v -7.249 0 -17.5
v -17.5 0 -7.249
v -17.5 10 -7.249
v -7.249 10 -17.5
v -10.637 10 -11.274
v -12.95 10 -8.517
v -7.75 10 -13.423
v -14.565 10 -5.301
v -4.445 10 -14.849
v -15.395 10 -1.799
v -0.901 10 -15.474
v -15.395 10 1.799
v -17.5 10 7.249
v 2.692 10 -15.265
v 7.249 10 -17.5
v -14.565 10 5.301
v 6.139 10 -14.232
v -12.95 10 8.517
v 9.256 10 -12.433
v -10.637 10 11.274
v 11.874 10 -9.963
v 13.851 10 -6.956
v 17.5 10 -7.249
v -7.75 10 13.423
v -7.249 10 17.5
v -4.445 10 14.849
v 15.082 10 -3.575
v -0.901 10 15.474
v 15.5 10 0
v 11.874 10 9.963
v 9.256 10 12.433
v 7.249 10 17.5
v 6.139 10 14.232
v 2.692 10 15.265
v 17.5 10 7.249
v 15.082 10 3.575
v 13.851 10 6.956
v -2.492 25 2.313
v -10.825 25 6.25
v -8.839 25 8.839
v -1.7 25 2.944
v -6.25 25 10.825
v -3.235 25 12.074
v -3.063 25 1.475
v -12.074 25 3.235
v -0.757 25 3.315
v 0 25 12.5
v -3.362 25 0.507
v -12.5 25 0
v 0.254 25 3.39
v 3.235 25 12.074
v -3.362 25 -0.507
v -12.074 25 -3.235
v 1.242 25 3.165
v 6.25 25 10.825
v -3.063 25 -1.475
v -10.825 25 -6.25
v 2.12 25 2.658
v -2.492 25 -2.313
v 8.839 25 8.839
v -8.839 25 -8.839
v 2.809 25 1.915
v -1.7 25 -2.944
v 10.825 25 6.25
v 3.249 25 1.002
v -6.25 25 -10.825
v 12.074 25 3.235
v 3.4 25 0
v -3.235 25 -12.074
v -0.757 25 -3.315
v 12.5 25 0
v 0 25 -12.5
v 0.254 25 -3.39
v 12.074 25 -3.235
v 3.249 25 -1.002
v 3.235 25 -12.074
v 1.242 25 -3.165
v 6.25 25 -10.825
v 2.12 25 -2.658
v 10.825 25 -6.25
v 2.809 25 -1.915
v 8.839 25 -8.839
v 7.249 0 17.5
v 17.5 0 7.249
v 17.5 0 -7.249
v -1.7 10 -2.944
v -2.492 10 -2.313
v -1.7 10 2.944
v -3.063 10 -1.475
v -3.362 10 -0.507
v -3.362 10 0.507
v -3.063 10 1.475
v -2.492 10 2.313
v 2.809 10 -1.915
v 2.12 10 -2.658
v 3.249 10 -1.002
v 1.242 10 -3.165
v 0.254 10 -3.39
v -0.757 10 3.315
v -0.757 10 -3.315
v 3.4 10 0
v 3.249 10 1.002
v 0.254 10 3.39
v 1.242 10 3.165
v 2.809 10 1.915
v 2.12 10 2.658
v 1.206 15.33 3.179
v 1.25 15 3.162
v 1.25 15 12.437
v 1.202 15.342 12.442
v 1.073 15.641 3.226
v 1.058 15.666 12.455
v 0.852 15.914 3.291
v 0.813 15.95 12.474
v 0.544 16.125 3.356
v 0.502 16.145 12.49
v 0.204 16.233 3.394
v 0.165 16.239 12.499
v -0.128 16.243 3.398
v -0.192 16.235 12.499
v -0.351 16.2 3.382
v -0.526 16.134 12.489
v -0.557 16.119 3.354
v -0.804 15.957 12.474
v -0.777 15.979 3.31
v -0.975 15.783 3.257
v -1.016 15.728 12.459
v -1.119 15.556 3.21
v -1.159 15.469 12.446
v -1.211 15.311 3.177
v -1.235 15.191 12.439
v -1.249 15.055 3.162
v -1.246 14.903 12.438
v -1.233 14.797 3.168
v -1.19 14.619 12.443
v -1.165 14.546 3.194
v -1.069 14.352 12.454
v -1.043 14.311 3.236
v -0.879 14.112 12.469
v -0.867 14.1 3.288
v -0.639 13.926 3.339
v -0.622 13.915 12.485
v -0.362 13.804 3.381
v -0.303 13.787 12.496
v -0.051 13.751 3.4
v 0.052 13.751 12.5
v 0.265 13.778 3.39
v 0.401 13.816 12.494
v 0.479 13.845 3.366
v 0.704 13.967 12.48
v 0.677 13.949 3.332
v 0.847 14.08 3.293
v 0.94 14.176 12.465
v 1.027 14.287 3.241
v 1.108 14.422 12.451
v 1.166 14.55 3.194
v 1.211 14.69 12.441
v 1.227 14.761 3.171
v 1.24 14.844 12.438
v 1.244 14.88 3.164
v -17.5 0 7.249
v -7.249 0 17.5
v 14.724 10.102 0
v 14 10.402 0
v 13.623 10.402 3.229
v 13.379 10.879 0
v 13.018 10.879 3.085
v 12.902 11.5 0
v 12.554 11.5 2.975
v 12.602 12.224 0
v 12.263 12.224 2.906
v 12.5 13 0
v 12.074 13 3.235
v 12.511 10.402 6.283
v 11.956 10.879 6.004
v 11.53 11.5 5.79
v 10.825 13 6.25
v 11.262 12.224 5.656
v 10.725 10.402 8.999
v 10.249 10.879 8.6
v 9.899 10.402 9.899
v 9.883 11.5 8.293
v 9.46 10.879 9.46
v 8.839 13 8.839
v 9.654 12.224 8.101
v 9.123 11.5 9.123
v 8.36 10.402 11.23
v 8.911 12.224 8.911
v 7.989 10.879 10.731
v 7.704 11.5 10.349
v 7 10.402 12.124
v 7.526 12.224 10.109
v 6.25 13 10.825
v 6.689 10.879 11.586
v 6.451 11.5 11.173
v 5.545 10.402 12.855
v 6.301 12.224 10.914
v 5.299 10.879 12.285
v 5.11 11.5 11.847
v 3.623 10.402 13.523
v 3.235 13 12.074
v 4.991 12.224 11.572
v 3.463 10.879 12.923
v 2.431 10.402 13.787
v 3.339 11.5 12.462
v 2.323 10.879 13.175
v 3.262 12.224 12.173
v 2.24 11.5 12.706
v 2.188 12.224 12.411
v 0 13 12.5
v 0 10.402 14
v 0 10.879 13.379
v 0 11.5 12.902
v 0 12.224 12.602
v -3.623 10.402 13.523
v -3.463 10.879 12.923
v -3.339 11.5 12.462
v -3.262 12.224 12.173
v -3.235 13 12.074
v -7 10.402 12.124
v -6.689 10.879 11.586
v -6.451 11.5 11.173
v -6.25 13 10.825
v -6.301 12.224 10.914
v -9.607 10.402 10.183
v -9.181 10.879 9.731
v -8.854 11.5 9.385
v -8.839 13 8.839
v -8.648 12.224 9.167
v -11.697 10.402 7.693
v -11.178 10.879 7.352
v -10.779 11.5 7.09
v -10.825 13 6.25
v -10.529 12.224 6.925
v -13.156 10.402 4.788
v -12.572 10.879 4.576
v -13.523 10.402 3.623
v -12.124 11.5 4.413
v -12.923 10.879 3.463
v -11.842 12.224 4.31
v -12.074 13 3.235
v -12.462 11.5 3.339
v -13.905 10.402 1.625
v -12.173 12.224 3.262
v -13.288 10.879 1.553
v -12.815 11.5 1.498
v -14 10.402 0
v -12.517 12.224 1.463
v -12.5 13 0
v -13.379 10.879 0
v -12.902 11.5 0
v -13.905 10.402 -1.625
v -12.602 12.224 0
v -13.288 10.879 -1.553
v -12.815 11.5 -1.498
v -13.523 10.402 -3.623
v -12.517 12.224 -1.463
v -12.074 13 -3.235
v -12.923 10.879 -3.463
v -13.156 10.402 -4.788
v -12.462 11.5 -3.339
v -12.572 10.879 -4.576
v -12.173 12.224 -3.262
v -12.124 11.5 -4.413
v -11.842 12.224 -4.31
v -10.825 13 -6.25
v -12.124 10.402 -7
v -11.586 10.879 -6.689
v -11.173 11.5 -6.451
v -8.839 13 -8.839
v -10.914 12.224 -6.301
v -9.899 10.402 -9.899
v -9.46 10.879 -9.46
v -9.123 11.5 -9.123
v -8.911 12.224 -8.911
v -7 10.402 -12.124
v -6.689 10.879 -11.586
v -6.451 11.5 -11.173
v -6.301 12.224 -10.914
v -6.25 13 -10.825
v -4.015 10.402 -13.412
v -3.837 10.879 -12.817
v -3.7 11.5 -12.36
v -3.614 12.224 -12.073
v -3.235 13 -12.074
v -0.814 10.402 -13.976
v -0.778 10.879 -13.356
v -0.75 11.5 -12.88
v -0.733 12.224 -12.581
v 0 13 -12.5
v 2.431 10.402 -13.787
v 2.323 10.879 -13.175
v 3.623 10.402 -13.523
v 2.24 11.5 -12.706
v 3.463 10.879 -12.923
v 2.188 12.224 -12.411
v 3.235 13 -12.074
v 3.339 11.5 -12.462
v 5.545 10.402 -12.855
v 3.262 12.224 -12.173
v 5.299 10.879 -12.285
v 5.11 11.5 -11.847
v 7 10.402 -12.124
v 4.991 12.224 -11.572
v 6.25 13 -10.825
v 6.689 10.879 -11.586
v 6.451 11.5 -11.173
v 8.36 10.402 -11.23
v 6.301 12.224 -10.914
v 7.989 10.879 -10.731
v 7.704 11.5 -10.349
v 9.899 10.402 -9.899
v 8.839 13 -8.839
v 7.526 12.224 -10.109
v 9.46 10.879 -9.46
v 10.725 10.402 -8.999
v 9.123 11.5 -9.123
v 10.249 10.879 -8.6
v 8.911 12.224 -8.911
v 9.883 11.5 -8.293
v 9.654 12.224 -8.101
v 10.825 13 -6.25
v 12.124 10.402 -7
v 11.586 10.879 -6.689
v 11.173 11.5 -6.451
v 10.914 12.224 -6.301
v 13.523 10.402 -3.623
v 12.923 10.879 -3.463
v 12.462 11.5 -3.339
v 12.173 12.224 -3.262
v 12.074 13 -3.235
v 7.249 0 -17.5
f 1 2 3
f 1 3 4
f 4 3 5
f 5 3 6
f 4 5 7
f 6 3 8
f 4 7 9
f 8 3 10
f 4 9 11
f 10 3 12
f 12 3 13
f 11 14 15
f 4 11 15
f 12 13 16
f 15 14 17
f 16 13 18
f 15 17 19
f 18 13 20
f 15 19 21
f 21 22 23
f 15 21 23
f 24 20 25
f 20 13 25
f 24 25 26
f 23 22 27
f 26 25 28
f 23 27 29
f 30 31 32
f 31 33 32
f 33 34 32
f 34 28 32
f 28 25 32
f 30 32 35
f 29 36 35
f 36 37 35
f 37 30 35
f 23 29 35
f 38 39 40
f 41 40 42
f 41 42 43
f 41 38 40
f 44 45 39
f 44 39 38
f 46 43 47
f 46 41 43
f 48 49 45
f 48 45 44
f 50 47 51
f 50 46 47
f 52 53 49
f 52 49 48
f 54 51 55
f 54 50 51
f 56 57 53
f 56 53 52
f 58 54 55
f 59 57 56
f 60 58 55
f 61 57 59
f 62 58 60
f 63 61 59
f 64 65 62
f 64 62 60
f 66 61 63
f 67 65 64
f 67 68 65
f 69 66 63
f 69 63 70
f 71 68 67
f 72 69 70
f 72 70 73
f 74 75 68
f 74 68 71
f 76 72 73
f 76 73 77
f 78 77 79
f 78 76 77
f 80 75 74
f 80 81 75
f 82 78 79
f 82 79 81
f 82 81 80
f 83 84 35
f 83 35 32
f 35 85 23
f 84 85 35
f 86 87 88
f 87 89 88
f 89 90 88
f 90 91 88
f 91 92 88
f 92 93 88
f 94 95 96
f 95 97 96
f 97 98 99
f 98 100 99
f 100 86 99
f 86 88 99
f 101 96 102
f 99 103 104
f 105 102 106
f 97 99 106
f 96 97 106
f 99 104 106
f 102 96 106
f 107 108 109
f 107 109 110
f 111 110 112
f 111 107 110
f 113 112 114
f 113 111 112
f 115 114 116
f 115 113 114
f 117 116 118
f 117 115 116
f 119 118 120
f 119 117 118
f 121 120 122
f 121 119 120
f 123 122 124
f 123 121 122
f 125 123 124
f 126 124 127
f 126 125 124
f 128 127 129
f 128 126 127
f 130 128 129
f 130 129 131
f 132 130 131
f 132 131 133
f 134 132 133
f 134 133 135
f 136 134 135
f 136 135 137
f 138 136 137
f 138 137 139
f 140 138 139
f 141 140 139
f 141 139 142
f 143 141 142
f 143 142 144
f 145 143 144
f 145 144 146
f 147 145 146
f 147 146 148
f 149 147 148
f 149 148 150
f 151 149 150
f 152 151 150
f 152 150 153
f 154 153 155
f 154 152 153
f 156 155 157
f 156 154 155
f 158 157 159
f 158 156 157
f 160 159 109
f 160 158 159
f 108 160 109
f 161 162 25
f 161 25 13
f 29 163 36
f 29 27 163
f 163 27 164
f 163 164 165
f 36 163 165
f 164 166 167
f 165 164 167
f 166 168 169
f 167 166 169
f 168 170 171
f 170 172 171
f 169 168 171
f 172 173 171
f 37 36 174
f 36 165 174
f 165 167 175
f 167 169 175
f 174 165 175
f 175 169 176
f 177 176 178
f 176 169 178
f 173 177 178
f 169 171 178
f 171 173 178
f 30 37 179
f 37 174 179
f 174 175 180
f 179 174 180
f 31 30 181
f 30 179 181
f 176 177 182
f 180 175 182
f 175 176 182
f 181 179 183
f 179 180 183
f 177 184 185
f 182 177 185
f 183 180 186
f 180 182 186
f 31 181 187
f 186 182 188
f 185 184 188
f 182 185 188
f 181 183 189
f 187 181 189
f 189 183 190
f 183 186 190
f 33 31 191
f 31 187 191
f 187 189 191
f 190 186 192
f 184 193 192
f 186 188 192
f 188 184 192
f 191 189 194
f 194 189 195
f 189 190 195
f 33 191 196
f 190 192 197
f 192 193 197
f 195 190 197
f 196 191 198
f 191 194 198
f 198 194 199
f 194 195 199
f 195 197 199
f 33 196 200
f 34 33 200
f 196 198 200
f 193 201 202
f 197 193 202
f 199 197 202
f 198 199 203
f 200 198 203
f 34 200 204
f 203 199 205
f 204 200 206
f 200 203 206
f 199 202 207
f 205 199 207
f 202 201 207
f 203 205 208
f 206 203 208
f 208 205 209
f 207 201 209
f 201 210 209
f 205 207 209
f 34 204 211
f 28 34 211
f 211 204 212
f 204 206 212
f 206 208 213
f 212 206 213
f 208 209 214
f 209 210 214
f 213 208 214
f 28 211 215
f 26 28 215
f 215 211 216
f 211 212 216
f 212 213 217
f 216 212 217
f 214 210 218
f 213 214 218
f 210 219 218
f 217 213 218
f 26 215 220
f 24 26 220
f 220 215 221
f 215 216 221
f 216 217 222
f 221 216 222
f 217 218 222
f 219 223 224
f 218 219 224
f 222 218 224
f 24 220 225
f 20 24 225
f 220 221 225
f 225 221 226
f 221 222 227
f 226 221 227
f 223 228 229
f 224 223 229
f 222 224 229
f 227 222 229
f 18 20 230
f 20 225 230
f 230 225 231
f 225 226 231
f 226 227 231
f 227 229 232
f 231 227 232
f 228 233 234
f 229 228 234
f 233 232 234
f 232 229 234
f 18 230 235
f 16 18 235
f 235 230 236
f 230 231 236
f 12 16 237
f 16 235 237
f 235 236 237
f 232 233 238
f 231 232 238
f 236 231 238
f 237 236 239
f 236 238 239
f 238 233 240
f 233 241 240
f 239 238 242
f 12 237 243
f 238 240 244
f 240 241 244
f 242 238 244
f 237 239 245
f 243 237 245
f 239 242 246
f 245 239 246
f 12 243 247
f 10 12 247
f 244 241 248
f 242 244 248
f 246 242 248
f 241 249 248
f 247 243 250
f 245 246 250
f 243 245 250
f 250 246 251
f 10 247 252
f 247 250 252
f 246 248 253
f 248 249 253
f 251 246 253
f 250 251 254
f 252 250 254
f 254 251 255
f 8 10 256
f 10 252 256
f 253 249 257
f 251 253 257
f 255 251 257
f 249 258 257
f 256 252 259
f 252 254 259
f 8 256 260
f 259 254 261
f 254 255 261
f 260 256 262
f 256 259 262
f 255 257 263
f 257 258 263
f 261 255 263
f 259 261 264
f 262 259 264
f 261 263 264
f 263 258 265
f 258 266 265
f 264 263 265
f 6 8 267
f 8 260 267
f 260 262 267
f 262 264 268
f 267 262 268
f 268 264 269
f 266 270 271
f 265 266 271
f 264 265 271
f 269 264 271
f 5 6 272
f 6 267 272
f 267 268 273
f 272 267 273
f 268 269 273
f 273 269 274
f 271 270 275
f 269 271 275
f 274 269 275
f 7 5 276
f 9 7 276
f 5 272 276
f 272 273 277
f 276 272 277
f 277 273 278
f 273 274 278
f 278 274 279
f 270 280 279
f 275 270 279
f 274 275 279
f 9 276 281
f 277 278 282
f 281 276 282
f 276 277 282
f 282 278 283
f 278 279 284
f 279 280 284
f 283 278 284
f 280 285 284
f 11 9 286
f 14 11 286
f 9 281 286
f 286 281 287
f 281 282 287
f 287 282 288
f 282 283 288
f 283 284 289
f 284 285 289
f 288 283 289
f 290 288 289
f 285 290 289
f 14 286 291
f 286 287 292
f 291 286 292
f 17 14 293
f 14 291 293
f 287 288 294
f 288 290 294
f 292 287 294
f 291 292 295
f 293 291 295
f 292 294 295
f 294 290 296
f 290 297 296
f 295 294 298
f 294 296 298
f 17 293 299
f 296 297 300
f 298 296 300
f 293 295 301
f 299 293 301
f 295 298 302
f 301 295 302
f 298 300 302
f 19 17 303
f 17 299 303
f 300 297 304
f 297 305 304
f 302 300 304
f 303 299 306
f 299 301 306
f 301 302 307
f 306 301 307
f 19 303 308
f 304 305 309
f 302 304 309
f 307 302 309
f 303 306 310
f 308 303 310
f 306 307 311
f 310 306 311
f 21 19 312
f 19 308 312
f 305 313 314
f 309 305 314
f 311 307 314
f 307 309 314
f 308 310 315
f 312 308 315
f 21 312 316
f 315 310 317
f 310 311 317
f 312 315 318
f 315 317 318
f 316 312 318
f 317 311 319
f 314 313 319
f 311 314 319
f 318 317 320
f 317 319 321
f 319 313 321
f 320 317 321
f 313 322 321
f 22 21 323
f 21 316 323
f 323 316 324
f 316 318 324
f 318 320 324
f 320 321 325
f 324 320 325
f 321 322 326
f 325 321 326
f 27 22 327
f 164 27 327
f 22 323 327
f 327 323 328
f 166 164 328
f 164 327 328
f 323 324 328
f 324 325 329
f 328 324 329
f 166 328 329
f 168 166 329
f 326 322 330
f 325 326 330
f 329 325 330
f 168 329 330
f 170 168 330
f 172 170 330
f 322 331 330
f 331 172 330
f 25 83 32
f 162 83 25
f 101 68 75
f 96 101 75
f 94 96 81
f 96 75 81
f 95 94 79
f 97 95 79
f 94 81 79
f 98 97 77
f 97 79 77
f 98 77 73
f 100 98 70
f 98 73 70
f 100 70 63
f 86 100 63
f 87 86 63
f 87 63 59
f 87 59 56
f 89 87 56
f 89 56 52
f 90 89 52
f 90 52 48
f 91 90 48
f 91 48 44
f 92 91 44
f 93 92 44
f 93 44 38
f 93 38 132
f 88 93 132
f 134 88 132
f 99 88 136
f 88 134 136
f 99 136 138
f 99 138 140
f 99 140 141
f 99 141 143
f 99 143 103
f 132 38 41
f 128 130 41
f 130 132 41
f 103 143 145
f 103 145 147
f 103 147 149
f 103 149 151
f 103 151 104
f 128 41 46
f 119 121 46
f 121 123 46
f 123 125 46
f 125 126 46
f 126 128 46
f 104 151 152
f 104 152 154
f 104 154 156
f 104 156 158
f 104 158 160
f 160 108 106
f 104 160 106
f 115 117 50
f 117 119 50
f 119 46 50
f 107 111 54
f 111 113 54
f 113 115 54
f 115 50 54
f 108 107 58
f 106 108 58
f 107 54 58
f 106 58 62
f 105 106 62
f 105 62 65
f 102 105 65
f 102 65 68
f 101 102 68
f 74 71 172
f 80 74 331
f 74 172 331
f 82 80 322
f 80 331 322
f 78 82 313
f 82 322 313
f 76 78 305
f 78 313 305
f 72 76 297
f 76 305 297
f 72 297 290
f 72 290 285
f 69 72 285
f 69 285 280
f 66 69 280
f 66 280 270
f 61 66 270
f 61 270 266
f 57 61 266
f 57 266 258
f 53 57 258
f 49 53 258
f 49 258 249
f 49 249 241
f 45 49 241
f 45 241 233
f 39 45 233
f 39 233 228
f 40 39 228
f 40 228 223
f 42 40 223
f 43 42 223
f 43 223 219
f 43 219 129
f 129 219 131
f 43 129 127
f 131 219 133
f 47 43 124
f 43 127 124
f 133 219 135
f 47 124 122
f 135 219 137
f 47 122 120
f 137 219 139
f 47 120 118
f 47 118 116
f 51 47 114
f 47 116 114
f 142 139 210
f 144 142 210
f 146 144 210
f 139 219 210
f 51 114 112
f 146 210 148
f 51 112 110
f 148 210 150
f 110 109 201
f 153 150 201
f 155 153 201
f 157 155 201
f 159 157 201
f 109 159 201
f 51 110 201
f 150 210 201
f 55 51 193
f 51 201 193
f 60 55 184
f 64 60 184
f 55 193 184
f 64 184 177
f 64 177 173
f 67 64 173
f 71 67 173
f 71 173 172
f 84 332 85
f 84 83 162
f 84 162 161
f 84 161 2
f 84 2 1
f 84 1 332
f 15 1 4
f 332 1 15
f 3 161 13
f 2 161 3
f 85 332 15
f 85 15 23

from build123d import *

# Parameters (mm, degrees)
SKETCH2_R               = 12.5
BOSS_EXTRUDE2_DEPTH     = 25
SKETCH3_R               = 3.4
CUT_EXTRUDE1_DEPTH      = 30
SKETCH4_R               = 1.25
CUT_EXTRUDE2_DEPTH      = 13.5
CUT_EXTRUDE2_DEPTH_BACK = 2.5
BOSS_EXTRUDE3_DEPTH     = 10
FILLET2_R               = 3


with BuildPart() as part:
    # Sketch2 → Boss-Extrude2 (new body)
    with BuildSketch(Plane(origin=(0, 0, 0), x_dir=(1, 0, 0), z_dir=(0, 1, 0))):
        Circle(SKETCH2_R)
    extrude(amount=BOSS_EXTRUDE2_DEPTH)

    # Sketch3 → Cut-Extrude1 (cut)
    with BuildSketch(Plane(origin=(0, 25, 0), x_dir=(1, 0, 0), z_dir=(0, 1, 0))):
        Circle(SKETCH3_R)
    extrude(amount=-CUT_EXTRUDE1_DEPTH, mode=Mode.SUBTRACT)

    # Sketch4 → Cut-Extrude2 (cut, two sides)
    with BuildSketch(Plane.XY) as cut_extrude2_sk:
        with Locations((0, 15)):
            Circle(SKETCH4_R)
    extrude(amount=CUT_EXTRUDE2_DEPTH, mode=Mode.SUBTRACT)
    extrude(cut_extrude2_sk.sketch, amount=-CUT_EXTRUDE2_DEPTH_BACK, mode=Mode.SUBTRACT)

    # Sketch5 → Boss-Extrude3 (add)
    with BuildSketch(Plane.XZ):
        Polygon((7.248737342, -17.5), (17.5, -7.248737342), (17.5, 7.248737342), (7.248737342, 17.5), (-7.248737342, 17.5), (-17.5, 7.248737342), (-17.5, -7.248737342), (-7.248737342, -17.5), align=None)
    extrude(amount=-BOSS_EXTRUDE3_DEPTH)

    # Fillet2
    fillet2_edges = [part.edges().sort_by_distance(p)[0] for p in [
        (-12.5, 10, 0),
    ]]
    fillet(fillet2_edges, radius=FILLET2_R)


solid = part.part
